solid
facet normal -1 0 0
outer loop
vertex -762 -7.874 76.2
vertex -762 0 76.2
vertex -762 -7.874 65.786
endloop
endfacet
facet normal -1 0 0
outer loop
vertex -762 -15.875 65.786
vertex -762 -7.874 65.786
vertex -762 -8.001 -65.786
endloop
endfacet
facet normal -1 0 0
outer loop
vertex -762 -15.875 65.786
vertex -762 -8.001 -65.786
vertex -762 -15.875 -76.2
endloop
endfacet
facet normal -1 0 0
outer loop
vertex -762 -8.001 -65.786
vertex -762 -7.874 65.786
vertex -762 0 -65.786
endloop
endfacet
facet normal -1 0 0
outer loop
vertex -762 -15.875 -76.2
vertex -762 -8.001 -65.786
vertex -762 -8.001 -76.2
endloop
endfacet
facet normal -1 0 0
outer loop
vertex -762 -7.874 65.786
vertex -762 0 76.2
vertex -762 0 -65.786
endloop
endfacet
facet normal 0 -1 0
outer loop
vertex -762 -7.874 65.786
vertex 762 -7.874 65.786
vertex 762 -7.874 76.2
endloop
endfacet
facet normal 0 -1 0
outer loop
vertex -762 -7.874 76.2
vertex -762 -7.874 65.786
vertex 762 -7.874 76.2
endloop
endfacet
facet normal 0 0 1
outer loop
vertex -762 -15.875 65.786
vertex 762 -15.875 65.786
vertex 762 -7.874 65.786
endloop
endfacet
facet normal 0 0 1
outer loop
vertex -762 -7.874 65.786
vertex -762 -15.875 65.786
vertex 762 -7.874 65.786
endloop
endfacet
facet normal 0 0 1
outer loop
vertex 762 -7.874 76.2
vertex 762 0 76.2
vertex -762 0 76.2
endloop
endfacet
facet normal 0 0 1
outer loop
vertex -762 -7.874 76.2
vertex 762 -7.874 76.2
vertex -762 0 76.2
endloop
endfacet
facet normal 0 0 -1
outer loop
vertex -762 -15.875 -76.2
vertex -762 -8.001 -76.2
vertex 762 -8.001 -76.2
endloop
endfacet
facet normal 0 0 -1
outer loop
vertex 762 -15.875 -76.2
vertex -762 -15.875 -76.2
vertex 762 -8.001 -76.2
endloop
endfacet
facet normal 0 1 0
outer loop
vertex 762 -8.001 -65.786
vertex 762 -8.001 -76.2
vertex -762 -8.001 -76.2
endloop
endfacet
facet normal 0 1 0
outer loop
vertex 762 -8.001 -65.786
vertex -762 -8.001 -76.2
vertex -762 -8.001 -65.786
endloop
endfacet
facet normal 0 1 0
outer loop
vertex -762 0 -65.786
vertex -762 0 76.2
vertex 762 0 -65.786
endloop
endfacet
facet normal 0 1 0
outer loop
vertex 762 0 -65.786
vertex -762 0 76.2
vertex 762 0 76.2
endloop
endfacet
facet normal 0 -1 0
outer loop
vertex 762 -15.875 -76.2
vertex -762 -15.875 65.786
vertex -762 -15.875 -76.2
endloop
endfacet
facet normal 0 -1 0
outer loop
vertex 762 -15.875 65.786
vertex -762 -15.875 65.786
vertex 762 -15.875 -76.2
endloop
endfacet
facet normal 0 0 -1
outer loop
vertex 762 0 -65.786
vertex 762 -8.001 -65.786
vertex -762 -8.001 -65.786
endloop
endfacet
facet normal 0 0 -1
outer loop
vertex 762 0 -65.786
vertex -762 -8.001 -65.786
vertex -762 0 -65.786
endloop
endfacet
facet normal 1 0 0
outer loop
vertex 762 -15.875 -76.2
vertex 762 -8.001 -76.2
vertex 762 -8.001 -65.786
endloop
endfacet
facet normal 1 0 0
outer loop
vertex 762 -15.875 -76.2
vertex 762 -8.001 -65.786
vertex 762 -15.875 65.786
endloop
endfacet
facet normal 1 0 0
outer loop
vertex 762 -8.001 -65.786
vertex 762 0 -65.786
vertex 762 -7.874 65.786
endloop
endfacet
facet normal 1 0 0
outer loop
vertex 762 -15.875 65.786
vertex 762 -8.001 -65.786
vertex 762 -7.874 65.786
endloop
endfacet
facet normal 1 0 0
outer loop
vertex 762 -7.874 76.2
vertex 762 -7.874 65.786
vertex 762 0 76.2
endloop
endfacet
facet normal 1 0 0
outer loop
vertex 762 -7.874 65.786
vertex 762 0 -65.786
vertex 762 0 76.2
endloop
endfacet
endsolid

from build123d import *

# Parameters (mm, degrees)
F1_DEPTH = 15.875
F2_W     = 8.001
F2_H     = 10.414
F3_DEPTH = 1524


with BuildPart() as f1:
    # F0 (on Front) → F1 (new body)
    with BuildSketch(Plane.XZ):
        Polygon((762, -76.2), (762, 0), (762, 76.2), (-762, 76.2), (-762, -76.2), align=None)
    extrude(amount=F1_DEPTH)

    # F2 (on face) → F3 (cut, through all)
    with BuildSketch(Plane.YZ.offset(762)):
        with Locations((-4.0005, -70.993)):
            Rectangle(F2_W, F2_H)
        with Locations((-11.8745, 70.993)):
            Rectangle(F2_W, F2_H)
    extrude(amount=-F3_DEPTH, mode=Mode.SUBTRACT)


solid = f1.part
